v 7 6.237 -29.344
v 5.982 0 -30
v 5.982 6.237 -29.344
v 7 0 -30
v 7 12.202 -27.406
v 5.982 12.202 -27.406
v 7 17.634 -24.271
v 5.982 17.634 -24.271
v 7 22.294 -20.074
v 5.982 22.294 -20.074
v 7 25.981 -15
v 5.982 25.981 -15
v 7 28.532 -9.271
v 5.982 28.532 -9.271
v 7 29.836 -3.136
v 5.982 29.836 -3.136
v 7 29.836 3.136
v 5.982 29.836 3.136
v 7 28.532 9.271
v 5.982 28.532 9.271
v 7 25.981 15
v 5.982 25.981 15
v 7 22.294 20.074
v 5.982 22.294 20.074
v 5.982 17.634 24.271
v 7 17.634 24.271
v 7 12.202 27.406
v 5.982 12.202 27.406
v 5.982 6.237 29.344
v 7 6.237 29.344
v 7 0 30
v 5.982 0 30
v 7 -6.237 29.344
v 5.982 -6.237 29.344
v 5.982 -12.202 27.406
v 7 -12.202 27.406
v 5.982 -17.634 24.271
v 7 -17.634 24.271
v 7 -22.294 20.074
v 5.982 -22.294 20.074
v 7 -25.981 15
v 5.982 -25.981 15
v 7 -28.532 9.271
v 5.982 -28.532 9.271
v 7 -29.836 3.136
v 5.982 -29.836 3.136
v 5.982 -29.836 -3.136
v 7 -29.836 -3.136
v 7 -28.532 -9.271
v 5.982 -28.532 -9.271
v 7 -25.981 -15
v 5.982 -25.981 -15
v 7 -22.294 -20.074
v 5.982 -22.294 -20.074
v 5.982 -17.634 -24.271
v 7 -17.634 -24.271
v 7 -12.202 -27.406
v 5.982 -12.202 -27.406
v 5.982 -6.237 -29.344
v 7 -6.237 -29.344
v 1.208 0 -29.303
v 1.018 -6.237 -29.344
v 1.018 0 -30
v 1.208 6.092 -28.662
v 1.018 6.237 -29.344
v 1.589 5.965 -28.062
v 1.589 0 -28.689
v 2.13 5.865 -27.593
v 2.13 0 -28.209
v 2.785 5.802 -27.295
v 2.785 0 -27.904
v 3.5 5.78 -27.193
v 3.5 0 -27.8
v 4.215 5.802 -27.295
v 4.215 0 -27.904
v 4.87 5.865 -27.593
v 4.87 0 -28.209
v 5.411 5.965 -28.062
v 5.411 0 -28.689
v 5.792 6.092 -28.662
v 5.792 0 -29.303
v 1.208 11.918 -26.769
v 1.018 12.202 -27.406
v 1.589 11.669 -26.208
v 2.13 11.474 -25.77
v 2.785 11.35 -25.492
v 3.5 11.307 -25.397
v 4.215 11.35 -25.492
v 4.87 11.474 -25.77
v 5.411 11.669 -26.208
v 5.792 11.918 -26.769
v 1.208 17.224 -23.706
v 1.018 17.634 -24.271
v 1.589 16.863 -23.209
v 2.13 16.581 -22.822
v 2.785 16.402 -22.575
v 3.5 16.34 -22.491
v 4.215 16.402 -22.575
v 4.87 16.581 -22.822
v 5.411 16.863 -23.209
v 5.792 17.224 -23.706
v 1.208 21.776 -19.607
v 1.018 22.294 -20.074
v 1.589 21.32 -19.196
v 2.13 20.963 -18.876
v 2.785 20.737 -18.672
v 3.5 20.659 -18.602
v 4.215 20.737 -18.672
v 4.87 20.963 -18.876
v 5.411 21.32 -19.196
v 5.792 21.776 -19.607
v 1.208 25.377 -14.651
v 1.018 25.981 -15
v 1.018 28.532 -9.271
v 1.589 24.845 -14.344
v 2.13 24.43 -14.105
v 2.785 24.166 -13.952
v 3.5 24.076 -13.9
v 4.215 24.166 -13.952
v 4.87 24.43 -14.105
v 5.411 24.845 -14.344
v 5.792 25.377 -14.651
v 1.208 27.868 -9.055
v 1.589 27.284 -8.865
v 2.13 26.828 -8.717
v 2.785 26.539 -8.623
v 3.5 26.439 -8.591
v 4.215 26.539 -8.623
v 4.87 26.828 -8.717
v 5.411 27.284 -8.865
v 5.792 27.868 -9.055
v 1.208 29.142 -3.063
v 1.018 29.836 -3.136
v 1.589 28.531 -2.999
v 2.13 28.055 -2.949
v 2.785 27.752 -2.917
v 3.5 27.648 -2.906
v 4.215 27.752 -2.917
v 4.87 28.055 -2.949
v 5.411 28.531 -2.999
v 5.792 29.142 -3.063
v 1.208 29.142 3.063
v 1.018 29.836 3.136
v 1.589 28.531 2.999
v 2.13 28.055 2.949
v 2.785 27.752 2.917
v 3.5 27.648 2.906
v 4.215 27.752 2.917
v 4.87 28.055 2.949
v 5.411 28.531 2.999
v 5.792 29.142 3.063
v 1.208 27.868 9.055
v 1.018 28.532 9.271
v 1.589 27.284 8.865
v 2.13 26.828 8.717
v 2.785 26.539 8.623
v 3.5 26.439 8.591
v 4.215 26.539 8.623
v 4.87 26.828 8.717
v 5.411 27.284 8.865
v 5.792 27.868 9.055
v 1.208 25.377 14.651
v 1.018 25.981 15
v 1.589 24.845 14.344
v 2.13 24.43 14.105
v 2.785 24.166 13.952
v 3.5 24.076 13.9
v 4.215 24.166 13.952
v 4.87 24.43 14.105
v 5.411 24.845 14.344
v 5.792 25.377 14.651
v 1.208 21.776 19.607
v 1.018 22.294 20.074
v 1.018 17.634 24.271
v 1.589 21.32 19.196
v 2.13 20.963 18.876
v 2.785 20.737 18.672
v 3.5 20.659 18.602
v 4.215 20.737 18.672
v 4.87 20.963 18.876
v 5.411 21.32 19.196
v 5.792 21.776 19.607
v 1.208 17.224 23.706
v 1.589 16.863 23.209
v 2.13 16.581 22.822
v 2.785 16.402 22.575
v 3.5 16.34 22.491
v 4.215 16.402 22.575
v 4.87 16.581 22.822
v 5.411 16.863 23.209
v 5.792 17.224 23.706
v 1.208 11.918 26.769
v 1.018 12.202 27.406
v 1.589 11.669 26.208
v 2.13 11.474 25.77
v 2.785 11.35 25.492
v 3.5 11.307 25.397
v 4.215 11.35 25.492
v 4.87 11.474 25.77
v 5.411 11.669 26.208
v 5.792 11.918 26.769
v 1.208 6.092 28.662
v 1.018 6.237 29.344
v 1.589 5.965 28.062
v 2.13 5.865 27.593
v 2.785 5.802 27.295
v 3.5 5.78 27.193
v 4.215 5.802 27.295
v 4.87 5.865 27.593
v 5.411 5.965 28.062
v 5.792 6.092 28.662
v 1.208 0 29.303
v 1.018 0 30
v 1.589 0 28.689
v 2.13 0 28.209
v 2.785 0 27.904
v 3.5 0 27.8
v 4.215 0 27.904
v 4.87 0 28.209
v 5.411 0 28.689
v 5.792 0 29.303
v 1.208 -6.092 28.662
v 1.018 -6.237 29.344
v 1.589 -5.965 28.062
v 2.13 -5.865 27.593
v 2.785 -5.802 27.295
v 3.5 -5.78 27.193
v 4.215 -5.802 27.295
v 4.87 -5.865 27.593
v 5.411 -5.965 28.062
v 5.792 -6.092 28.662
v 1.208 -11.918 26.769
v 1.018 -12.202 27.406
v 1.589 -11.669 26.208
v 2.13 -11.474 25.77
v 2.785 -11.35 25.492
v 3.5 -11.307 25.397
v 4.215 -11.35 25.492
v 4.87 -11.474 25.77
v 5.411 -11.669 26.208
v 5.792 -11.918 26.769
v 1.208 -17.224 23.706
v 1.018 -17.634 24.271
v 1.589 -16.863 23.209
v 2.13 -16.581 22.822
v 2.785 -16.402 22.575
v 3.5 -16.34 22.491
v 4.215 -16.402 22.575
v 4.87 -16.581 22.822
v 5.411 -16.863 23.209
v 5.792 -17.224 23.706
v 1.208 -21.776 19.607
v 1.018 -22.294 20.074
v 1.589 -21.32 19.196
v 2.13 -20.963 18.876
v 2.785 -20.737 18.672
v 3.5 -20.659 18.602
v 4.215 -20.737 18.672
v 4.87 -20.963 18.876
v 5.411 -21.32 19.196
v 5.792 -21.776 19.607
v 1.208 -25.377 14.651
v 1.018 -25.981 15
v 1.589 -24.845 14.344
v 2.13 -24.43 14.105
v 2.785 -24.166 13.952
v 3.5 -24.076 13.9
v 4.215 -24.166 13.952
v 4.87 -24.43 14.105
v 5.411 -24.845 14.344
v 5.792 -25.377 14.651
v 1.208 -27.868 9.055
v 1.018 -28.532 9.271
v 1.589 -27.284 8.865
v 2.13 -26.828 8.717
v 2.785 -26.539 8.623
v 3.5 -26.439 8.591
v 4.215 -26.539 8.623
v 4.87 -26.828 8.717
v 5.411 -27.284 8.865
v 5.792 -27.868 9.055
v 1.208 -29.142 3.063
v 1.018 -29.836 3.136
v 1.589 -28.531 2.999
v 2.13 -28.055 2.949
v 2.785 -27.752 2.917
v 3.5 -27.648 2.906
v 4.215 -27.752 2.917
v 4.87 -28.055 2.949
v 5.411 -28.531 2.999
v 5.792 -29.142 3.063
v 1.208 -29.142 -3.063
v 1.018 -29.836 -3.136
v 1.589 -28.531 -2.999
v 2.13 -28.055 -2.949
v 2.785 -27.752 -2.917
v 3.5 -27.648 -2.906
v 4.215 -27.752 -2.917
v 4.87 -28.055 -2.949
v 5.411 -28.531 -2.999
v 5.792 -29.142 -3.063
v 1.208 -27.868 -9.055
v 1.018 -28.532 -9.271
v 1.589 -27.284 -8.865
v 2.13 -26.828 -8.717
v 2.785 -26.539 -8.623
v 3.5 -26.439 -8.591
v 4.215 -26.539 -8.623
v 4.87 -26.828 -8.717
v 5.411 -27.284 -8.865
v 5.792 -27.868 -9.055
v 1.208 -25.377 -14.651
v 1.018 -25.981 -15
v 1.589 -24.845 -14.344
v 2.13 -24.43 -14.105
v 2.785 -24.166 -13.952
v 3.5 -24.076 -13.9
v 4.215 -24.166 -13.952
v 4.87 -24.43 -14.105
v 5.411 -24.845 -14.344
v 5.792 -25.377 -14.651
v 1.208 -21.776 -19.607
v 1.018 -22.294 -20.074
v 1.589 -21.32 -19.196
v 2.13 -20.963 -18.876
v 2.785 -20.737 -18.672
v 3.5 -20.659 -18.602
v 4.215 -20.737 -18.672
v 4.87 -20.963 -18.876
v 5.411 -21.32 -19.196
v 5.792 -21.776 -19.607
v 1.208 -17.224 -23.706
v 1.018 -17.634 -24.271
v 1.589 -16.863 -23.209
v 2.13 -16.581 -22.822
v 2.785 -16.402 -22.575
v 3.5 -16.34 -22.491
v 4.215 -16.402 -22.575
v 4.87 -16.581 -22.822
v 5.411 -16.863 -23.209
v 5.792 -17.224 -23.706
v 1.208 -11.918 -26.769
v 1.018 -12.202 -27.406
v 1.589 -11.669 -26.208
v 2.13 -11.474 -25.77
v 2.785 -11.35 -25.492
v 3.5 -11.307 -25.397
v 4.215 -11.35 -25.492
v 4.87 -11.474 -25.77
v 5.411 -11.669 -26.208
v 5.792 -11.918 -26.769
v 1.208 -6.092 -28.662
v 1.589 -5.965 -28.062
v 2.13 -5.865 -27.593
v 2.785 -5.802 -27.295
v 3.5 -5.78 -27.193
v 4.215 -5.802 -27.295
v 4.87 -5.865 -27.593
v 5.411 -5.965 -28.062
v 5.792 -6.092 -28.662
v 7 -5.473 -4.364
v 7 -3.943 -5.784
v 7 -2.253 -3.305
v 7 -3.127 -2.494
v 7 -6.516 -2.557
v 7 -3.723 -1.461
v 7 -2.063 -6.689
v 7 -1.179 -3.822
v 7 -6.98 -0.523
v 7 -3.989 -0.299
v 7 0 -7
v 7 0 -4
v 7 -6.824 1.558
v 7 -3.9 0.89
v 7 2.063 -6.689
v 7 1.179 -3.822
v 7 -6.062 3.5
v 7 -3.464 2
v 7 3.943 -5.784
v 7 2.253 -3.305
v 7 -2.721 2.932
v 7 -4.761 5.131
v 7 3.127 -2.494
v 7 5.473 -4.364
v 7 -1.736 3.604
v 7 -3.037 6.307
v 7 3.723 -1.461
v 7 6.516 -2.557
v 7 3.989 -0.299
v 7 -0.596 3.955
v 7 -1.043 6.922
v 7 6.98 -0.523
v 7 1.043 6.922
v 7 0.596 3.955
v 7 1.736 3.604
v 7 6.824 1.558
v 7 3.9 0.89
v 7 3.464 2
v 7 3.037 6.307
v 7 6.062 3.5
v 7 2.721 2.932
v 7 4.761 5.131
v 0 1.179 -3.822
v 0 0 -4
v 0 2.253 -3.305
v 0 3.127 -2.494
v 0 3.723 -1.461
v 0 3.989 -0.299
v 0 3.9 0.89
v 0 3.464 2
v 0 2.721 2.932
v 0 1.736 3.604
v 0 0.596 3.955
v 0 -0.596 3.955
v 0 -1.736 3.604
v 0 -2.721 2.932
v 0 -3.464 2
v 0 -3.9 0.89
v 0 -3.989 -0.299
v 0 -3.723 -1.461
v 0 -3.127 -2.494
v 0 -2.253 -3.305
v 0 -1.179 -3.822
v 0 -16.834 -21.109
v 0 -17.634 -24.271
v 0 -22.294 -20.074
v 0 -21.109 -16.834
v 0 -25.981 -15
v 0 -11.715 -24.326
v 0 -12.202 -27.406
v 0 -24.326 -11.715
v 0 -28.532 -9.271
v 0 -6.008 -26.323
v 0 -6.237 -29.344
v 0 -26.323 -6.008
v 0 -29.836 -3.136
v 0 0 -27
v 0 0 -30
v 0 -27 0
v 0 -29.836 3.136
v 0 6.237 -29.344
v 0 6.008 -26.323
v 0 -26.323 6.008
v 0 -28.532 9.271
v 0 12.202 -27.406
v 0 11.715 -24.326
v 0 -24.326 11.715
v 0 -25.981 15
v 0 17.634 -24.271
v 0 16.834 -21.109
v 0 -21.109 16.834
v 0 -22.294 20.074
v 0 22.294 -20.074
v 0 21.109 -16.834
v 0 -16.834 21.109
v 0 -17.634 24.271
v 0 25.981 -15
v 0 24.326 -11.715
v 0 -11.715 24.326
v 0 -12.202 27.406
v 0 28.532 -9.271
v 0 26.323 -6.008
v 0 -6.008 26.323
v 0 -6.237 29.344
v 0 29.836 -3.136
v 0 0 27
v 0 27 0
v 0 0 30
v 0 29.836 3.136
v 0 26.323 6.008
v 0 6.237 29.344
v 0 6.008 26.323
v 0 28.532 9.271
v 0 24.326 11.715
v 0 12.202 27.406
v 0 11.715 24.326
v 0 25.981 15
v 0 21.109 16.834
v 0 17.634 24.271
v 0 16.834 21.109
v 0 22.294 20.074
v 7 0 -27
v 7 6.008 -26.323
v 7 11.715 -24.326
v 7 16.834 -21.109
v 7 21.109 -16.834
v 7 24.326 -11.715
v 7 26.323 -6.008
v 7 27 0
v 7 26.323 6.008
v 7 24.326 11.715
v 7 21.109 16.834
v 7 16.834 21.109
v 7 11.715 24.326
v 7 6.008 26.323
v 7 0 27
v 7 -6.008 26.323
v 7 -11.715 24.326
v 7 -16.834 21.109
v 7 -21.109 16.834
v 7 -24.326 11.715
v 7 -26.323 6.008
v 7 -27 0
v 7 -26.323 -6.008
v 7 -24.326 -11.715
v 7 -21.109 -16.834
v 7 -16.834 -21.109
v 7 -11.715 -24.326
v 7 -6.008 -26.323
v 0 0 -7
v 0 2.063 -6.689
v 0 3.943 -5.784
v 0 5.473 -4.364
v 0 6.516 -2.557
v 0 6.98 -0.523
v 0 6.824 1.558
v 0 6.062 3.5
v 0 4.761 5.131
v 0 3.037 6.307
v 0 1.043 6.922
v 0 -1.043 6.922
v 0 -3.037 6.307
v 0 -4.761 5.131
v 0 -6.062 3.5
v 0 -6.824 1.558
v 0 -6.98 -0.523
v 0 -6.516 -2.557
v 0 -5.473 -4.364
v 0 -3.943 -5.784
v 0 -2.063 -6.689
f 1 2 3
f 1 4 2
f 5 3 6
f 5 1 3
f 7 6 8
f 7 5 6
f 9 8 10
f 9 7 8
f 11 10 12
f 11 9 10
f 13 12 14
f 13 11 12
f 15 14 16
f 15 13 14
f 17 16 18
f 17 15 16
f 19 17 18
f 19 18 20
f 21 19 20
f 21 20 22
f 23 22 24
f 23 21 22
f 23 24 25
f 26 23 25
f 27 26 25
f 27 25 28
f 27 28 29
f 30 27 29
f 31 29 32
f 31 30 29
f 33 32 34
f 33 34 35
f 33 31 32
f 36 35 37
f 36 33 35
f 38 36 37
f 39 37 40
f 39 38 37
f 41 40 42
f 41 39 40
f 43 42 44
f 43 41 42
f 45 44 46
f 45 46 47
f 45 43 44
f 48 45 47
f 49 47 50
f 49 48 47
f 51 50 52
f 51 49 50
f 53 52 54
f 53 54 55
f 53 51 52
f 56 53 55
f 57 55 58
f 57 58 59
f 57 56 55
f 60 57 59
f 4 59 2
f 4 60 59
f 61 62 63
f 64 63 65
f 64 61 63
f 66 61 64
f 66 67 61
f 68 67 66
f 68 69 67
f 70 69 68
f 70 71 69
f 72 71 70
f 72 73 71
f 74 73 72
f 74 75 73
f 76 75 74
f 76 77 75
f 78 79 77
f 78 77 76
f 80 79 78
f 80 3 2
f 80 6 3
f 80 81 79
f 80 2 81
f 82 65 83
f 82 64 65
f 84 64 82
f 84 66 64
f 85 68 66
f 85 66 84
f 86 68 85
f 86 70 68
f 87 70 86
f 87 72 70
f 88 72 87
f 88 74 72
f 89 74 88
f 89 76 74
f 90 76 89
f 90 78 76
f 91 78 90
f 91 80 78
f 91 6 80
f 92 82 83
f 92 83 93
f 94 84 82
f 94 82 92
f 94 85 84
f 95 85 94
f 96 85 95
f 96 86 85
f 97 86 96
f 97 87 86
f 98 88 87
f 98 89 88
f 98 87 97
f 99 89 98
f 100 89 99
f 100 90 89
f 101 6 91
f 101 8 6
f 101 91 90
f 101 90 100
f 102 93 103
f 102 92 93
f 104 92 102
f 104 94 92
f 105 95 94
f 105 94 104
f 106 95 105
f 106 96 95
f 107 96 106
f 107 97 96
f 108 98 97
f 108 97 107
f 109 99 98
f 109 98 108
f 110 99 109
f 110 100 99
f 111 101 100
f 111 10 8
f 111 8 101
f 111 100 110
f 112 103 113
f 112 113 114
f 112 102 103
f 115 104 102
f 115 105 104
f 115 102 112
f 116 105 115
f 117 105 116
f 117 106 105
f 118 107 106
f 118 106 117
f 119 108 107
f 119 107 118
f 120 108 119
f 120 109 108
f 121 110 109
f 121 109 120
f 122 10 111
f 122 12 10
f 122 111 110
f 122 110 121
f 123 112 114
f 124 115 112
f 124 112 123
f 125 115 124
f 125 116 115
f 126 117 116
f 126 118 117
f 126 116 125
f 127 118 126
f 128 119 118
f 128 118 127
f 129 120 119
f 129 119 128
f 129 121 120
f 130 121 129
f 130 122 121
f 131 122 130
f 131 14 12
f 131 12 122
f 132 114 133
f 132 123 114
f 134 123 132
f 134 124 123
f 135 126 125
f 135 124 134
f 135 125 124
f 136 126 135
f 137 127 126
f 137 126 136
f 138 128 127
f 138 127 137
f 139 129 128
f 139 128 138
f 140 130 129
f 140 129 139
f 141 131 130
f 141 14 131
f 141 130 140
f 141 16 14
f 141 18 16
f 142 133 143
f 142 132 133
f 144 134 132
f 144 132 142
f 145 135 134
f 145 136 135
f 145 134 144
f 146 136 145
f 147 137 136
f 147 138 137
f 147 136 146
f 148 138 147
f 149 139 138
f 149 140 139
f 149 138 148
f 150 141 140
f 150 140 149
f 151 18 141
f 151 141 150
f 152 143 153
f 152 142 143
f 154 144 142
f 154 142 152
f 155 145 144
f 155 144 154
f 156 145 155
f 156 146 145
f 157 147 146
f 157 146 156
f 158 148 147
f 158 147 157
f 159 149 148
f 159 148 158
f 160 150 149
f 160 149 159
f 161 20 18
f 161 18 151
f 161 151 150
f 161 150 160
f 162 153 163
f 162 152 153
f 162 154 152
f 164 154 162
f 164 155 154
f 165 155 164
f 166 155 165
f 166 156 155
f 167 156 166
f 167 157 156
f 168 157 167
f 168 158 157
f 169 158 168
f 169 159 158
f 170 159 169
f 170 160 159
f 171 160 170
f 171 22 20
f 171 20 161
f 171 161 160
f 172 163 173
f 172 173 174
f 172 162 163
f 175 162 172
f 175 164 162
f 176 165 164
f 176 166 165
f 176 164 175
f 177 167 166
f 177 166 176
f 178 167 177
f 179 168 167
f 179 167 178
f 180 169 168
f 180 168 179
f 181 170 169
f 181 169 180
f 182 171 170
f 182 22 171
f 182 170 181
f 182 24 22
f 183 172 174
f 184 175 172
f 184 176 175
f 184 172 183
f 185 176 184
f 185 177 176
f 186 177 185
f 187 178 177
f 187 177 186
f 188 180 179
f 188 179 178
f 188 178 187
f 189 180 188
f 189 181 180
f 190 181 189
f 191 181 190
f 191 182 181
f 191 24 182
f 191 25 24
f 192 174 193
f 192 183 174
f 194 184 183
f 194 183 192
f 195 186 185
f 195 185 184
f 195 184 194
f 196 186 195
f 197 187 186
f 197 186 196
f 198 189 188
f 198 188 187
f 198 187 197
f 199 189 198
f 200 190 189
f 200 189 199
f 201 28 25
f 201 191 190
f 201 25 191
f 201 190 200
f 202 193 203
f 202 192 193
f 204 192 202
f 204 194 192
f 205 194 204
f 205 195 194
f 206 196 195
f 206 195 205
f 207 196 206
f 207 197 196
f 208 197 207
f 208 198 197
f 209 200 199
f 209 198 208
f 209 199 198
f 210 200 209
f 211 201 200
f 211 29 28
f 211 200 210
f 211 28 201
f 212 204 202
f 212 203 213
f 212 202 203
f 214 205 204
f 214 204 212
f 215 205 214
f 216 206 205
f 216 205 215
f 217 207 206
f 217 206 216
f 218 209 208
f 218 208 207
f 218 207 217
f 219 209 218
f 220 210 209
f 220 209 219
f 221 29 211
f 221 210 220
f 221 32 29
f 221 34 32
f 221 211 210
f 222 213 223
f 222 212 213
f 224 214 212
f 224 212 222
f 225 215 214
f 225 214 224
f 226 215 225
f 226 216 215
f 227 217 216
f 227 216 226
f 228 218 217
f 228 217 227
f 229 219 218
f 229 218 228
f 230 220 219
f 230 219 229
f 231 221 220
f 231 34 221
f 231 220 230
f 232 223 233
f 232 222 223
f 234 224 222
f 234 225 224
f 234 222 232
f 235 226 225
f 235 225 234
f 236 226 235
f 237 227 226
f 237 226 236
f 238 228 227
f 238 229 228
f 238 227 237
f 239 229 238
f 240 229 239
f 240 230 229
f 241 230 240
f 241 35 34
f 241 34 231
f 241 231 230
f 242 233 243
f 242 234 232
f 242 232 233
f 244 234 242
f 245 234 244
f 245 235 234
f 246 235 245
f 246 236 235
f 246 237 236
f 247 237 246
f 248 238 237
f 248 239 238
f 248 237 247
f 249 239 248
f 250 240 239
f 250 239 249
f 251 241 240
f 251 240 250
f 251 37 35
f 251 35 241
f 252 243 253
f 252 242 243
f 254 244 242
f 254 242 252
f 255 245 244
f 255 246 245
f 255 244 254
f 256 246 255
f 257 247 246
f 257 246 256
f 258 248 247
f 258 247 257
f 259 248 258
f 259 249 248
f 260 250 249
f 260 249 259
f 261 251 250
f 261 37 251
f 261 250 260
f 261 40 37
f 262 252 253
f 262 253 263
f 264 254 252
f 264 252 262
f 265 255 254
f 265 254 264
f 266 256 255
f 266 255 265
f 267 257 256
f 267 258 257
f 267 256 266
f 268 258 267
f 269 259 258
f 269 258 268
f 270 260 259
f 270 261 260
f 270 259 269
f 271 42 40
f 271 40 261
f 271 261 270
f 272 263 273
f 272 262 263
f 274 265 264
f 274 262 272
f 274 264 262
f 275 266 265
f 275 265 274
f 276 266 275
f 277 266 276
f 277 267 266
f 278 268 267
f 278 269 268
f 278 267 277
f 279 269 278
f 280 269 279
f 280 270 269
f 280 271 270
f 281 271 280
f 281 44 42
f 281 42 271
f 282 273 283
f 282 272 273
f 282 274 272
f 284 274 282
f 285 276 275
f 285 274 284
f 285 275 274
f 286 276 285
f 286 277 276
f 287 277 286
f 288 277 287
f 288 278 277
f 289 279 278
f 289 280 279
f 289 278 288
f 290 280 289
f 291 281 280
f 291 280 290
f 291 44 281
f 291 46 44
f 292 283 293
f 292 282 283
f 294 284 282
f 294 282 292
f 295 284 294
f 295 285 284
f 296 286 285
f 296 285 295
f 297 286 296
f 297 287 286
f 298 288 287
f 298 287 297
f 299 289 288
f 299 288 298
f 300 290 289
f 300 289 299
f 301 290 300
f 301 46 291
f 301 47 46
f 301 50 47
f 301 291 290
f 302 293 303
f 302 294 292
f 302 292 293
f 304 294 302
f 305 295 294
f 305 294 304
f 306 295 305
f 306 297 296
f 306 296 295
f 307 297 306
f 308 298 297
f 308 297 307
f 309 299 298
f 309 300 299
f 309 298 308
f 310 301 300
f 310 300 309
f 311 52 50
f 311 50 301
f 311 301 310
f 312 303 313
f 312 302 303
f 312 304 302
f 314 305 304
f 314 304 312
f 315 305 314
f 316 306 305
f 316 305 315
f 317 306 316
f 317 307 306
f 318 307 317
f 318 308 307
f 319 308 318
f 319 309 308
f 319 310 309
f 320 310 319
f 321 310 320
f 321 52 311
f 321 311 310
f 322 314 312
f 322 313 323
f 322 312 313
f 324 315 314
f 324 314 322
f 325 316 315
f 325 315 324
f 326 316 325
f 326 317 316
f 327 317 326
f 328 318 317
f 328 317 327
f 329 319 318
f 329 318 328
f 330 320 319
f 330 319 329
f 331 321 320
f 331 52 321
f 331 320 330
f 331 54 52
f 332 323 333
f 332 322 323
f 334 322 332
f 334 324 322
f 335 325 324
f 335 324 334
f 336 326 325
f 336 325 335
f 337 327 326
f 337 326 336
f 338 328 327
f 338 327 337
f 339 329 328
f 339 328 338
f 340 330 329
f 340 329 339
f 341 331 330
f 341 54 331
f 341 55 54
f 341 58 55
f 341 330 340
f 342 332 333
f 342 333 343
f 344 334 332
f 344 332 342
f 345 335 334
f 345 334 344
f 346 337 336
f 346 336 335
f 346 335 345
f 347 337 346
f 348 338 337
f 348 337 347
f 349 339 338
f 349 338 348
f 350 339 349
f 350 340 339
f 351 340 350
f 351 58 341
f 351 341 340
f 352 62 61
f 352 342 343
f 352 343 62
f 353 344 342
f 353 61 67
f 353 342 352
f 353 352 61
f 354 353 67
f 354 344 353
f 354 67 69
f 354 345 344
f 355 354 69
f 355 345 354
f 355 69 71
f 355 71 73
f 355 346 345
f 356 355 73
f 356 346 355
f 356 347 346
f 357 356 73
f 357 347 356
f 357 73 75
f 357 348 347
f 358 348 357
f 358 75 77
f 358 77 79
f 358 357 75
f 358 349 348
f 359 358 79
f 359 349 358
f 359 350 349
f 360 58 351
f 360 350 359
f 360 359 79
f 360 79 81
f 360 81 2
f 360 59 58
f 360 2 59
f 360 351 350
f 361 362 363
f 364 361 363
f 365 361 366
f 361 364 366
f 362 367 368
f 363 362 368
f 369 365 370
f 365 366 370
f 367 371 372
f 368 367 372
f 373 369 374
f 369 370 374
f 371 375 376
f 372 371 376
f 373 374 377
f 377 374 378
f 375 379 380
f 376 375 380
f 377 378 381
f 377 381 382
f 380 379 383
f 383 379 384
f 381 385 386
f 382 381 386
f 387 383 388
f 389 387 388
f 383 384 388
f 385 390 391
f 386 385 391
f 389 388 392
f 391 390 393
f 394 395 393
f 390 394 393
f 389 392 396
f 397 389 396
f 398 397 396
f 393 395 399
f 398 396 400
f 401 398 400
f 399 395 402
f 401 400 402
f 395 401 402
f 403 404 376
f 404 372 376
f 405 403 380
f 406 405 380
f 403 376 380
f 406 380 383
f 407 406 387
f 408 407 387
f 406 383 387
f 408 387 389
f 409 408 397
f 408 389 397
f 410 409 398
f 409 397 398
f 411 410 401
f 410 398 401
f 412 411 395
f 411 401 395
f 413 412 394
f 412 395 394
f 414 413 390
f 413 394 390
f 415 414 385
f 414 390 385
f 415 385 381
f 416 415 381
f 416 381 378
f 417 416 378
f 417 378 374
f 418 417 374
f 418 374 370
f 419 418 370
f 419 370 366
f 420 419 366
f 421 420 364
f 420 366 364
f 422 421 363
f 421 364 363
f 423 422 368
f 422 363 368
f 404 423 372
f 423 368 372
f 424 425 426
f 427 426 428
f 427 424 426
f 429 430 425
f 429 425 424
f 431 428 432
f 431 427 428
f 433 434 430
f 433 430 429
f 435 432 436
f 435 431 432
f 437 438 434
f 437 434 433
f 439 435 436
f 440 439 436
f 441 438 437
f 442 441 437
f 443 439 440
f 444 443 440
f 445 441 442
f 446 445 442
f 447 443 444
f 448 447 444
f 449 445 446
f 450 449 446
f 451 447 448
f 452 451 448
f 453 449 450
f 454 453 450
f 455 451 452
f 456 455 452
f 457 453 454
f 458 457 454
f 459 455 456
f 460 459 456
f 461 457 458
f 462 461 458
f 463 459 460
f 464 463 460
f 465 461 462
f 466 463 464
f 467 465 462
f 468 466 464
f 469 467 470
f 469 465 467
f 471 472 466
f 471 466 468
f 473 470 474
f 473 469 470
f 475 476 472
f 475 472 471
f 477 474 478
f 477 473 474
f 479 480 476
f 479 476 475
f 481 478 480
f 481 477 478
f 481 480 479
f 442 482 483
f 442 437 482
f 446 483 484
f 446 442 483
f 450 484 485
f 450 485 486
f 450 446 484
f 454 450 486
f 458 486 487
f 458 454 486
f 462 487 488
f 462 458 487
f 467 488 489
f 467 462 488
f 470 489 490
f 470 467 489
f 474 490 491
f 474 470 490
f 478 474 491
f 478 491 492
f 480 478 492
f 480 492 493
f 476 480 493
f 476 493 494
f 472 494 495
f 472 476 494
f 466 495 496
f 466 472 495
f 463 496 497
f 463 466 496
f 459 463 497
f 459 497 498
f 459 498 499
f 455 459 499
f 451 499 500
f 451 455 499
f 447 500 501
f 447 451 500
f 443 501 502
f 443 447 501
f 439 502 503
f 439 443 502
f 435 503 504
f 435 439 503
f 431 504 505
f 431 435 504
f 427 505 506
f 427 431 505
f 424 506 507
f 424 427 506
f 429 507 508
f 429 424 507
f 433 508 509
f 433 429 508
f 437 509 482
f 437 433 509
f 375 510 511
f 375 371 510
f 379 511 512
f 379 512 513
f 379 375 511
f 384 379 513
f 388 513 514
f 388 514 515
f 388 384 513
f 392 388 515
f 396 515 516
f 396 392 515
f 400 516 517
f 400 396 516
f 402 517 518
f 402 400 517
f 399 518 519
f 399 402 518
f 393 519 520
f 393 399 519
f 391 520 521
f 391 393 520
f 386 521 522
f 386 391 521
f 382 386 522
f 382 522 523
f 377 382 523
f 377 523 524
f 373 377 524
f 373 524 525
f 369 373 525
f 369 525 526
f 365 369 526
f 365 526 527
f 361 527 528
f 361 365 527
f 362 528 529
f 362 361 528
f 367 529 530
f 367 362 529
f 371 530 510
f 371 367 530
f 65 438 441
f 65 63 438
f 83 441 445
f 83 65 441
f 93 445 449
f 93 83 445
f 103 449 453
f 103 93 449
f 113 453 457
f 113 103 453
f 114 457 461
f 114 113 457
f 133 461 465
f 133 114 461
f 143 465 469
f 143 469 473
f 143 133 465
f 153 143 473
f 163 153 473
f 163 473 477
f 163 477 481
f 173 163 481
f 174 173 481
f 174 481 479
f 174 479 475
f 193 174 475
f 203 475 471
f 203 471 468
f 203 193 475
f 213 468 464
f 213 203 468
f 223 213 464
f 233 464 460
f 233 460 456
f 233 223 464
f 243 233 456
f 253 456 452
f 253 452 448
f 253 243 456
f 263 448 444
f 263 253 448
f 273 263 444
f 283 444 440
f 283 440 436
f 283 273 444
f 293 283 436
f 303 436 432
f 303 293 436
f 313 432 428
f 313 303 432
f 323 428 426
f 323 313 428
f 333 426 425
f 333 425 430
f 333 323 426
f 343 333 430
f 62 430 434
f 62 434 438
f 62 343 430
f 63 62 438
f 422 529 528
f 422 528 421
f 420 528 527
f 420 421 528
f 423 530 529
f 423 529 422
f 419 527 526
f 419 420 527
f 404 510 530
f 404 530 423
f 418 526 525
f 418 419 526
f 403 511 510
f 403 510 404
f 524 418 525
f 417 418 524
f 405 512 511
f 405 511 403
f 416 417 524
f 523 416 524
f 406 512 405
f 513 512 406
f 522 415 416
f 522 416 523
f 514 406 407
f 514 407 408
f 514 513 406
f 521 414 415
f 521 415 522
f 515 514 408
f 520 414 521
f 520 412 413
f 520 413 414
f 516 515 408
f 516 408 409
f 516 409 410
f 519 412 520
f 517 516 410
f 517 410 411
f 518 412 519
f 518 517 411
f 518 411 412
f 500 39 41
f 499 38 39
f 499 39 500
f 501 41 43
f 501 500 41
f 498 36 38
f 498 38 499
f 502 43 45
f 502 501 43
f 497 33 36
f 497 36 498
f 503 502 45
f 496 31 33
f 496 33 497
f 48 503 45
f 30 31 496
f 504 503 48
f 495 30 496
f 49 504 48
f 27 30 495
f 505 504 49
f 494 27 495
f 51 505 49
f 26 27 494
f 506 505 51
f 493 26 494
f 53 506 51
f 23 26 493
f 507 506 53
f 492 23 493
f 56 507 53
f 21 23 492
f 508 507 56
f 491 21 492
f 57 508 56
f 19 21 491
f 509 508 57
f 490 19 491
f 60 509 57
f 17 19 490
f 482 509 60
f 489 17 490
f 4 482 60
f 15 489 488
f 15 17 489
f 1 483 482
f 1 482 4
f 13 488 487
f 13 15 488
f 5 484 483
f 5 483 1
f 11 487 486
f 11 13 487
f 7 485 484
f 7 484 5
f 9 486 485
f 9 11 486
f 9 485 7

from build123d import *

# Parameters (mm, degrees)
SKETCH1_W = 7
SKETCH1_H = 3


with BuildPart() as part:
    # Sketch1 → Revolve1 (revolve)
    with BuildSketch(Plane(origin=(0, 0, 0), x_dir=(1, 0, 0), z_dir=(0, 1, 0))):
        with Locations((3.5, 5.5)):
            Rectangle(SKETCH1_W, SKETCH1_H)
        with BuildLine():
            Line((0, 30), (1.018065271, 30))
            ThreePointArc((1.018065271, 30), (3.5, 27.8), (5.981934729, 30))
            Line((5.981934729, 30), (7, 30))
            Line((7, 30), (7, 27))
            Line((7, 27), (0, 27))
            Line((0, 27), (0, 30))
        make_face()
    revolve(axis=Axis((0, 0, 0), (1, 0, 0)))


solid = part.part
